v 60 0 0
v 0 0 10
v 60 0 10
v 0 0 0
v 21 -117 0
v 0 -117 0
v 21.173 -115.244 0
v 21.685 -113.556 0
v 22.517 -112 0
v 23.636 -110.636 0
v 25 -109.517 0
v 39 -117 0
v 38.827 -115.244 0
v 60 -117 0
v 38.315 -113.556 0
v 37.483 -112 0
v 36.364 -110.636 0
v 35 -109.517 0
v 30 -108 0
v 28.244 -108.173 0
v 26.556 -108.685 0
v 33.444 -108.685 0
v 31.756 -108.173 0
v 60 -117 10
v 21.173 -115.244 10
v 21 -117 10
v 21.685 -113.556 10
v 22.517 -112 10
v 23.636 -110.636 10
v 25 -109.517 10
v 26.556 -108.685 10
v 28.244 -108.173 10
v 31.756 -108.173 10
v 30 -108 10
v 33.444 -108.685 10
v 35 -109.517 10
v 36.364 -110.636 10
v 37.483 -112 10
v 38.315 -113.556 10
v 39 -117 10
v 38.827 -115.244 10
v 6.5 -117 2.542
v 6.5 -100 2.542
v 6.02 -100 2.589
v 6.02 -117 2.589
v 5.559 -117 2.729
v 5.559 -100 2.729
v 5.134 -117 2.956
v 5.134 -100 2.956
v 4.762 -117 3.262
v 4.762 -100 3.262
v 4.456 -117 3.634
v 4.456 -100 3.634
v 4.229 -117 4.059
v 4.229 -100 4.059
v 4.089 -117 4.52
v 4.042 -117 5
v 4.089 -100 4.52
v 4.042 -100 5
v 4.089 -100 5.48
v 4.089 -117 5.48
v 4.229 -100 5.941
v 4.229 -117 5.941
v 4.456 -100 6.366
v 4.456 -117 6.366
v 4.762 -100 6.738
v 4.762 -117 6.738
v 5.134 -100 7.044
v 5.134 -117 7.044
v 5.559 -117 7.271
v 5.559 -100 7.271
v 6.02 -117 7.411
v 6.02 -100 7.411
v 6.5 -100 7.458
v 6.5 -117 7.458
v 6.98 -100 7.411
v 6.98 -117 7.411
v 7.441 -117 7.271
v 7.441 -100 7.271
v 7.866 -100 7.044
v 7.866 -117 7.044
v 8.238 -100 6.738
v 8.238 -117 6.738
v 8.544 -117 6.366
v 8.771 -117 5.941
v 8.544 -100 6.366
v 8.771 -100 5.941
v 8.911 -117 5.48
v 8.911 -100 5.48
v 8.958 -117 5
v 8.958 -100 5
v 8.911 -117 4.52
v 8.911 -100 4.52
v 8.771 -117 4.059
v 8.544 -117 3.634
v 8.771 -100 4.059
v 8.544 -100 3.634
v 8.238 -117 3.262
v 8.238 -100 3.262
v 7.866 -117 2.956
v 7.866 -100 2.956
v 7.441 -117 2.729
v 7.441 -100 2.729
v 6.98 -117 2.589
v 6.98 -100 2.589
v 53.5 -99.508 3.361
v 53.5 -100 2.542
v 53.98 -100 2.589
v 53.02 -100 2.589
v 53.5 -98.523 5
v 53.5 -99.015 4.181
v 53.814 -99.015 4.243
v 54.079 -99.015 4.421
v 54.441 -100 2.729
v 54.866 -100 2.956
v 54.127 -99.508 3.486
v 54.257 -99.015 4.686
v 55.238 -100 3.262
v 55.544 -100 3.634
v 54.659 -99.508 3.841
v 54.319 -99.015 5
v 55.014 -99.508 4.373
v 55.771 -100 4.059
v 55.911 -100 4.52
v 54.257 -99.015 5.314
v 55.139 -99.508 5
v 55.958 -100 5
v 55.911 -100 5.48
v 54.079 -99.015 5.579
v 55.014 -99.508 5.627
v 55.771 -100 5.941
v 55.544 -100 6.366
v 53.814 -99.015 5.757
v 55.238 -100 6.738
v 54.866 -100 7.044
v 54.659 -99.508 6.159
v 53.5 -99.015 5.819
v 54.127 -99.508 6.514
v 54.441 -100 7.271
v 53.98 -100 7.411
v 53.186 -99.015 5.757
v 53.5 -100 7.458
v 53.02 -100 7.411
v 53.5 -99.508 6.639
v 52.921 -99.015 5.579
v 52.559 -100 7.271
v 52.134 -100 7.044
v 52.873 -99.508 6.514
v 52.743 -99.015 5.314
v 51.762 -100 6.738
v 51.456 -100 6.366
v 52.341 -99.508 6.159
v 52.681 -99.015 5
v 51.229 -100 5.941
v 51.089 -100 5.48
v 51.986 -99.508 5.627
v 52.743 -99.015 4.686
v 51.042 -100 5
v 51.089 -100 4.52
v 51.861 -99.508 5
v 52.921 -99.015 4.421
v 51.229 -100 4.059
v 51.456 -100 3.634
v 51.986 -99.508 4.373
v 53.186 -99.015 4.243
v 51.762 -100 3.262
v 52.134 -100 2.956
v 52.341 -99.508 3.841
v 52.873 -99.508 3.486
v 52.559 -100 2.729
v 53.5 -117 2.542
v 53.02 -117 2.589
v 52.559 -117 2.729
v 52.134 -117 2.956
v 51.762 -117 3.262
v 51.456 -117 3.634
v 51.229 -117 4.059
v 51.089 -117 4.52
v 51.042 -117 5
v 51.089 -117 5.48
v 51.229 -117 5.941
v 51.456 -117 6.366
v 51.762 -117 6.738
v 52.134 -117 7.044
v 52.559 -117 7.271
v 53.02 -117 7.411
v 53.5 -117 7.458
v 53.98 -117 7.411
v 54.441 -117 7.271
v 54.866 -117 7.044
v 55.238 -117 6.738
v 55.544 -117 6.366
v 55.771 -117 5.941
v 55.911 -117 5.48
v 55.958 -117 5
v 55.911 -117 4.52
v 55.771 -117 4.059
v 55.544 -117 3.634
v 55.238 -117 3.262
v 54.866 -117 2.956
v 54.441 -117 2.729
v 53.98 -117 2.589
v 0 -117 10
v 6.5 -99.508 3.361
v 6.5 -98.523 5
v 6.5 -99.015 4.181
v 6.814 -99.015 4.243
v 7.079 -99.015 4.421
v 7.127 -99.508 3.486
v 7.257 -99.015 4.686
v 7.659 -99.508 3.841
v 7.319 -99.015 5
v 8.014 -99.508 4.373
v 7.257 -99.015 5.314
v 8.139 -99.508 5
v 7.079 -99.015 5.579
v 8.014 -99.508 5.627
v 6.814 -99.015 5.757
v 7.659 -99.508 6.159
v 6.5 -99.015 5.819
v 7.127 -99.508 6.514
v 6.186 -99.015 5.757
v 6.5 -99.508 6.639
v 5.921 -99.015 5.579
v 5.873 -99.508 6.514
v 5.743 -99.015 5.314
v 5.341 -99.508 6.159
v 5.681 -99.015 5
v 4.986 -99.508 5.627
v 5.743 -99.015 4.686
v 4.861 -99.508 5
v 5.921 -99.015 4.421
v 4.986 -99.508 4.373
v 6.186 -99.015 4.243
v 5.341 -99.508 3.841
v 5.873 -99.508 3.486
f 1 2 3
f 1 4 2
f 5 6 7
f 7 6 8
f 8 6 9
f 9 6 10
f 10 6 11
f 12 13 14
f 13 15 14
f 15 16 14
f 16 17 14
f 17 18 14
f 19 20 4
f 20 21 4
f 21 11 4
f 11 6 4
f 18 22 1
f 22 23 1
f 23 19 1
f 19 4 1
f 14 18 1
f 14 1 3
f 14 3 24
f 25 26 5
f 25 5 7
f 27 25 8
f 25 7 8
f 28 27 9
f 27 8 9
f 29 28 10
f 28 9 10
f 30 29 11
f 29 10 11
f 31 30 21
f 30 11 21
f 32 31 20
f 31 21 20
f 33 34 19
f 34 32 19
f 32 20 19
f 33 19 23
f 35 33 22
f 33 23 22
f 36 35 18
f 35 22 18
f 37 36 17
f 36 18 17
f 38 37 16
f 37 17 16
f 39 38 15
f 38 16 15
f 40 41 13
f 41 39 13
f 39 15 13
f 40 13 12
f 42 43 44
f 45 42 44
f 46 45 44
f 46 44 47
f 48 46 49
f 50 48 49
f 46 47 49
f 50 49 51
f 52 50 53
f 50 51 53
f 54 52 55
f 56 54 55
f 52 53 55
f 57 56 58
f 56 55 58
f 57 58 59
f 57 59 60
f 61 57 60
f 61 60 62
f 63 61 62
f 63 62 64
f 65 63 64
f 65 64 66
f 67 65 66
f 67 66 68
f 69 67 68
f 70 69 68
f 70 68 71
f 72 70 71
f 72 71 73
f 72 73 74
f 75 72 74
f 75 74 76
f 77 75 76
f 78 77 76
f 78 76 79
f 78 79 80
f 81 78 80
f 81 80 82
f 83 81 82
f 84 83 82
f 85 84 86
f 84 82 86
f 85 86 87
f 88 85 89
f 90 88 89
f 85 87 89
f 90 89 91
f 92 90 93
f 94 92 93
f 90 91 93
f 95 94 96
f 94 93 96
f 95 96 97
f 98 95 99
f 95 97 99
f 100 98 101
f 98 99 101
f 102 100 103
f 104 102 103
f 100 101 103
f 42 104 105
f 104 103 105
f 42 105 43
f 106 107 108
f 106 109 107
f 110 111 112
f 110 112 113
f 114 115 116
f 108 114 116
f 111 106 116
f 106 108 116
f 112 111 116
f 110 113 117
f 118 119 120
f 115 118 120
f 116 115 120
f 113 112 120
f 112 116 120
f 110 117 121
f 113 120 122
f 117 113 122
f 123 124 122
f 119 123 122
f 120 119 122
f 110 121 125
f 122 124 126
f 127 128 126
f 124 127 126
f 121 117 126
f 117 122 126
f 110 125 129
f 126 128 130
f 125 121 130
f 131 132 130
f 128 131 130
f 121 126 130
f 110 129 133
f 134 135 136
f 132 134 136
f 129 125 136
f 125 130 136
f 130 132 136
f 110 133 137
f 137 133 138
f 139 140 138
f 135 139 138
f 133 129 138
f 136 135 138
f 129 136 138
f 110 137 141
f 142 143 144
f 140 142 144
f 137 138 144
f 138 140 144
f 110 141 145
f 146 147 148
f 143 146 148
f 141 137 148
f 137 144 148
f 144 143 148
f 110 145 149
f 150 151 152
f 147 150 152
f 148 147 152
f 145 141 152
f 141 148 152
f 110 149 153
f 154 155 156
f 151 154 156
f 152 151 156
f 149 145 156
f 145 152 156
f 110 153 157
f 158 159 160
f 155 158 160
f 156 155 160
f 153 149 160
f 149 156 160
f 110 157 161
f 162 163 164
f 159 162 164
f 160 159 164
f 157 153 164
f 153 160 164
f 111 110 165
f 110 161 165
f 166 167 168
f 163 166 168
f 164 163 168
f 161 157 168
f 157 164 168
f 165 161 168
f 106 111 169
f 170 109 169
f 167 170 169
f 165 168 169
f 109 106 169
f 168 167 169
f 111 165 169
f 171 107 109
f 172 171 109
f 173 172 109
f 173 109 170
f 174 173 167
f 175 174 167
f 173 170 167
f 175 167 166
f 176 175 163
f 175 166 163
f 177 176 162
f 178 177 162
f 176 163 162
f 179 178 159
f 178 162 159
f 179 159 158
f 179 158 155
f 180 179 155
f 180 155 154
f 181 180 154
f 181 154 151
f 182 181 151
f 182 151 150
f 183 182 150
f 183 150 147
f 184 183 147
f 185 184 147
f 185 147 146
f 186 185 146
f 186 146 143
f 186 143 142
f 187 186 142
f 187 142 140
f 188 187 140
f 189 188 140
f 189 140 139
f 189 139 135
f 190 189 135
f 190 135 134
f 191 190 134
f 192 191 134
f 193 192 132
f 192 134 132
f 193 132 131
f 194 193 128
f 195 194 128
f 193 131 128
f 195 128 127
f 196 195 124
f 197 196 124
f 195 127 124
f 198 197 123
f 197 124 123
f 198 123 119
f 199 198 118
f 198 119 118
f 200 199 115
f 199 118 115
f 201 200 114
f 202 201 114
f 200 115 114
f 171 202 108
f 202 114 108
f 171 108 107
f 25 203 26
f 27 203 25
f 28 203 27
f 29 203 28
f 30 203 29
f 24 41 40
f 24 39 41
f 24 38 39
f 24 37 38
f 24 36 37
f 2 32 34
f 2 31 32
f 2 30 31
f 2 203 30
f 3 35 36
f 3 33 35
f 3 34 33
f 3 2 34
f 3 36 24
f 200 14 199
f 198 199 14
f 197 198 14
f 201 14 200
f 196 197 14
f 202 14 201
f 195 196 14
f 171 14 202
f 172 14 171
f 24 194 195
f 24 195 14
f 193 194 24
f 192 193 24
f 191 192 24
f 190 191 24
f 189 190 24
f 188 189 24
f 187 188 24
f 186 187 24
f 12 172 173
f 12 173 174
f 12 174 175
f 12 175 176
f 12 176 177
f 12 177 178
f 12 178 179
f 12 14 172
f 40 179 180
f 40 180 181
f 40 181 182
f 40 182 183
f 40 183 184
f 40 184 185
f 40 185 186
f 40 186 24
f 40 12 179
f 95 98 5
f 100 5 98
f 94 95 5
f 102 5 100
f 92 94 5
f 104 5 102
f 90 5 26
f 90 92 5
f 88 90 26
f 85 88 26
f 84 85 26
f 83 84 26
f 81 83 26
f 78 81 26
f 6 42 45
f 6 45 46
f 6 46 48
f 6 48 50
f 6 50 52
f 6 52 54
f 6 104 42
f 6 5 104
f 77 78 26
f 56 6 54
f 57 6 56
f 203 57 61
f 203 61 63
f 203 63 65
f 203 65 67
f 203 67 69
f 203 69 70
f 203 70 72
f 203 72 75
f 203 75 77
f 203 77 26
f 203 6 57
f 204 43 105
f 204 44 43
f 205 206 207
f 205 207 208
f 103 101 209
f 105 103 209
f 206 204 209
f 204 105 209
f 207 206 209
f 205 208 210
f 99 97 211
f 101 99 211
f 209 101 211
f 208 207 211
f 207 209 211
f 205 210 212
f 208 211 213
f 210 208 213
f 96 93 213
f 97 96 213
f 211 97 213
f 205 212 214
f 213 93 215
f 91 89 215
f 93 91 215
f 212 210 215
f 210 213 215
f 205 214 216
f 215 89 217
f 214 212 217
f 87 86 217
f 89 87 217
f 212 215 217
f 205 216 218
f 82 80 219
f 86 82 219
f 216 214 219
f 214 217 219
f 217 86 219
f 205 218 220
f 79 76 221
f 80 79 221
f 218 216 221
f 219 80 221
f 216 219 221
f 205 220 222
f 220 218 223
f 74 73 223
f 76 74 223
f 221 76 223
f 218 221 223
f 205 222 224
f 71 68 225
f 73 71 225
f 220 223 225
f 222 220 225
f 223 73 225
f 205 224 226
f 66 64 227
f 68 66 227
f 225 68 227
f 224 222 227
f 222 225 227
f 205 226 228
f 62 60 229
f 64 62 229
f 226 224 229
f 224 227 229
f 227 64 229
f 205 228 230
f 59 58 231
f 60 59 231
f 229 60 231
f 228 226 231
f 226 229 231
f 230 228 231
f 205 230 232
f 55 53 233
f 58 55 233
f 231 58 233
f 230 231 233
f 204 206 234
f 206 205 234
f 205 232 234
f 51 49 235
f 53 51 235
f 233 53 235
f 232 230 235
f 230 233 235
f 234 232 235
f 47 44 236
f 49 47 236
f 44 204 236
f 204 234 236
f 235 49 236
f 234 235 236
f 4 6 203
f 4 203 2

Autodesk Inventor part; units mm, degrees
ref_plane "YZ Plane" through (0, 0, 0) normal (1, 0, 0) x (0, 1, 0)
ref_plane "XZ Plane" through (0, 0, 0) normal (0, 1, 0) x (-1, 0, 0)
sketch "Skizze1" plane through (0, 0, 0) normal (0, 0, 1) x (1, 0, 0)
  line L0 (0, 0) -> (60, 0)
  line L1 (60, 0) -> (60, -150)
  line L2 (60, -150) -> (0, -150)
  line L3 (0, -150) -> (0, 0)
  circle A0 centre (30, -117) radius 9
  dimension "d0" = 60
  dimension "d1" = 150
  dimension "d2" = 18
extrude "Extrusion1" add sketch "Skizze1" along normal blind 10
sketch "Skizze2" plane through (0, -150, 0) normal (0, -1, 0) x (1, 0, 0)
  point P0 (0, 0)
  point P1 (6.5, 5)
  point P2 (53.5, 5)
hole "Bohrung1" at (6.5, -150, 5) at (53.5, -150, 5) direction (0, 1, 0) diameter 4.917 depth 50 tip angle 118 thread size "M6x1" class "6H" standard "ISO Metric profile"
sketch "Skizze3" plane through (0, 0, 0) normal (0, 0, -1) x (-1, 0, 0)
  line L0 (-5, -117) -> (-55, -117)
  point P0 (0, 0)
ref_plane "Arbeitsebene1" through (5, -117, 0) normal (0, 1, 0) x (1, 0, 0)
split "Trennen1" plane through (5, -117, 0) removes the side toward (0, -1, 0)
properties part number "Steher oben Rohr"
